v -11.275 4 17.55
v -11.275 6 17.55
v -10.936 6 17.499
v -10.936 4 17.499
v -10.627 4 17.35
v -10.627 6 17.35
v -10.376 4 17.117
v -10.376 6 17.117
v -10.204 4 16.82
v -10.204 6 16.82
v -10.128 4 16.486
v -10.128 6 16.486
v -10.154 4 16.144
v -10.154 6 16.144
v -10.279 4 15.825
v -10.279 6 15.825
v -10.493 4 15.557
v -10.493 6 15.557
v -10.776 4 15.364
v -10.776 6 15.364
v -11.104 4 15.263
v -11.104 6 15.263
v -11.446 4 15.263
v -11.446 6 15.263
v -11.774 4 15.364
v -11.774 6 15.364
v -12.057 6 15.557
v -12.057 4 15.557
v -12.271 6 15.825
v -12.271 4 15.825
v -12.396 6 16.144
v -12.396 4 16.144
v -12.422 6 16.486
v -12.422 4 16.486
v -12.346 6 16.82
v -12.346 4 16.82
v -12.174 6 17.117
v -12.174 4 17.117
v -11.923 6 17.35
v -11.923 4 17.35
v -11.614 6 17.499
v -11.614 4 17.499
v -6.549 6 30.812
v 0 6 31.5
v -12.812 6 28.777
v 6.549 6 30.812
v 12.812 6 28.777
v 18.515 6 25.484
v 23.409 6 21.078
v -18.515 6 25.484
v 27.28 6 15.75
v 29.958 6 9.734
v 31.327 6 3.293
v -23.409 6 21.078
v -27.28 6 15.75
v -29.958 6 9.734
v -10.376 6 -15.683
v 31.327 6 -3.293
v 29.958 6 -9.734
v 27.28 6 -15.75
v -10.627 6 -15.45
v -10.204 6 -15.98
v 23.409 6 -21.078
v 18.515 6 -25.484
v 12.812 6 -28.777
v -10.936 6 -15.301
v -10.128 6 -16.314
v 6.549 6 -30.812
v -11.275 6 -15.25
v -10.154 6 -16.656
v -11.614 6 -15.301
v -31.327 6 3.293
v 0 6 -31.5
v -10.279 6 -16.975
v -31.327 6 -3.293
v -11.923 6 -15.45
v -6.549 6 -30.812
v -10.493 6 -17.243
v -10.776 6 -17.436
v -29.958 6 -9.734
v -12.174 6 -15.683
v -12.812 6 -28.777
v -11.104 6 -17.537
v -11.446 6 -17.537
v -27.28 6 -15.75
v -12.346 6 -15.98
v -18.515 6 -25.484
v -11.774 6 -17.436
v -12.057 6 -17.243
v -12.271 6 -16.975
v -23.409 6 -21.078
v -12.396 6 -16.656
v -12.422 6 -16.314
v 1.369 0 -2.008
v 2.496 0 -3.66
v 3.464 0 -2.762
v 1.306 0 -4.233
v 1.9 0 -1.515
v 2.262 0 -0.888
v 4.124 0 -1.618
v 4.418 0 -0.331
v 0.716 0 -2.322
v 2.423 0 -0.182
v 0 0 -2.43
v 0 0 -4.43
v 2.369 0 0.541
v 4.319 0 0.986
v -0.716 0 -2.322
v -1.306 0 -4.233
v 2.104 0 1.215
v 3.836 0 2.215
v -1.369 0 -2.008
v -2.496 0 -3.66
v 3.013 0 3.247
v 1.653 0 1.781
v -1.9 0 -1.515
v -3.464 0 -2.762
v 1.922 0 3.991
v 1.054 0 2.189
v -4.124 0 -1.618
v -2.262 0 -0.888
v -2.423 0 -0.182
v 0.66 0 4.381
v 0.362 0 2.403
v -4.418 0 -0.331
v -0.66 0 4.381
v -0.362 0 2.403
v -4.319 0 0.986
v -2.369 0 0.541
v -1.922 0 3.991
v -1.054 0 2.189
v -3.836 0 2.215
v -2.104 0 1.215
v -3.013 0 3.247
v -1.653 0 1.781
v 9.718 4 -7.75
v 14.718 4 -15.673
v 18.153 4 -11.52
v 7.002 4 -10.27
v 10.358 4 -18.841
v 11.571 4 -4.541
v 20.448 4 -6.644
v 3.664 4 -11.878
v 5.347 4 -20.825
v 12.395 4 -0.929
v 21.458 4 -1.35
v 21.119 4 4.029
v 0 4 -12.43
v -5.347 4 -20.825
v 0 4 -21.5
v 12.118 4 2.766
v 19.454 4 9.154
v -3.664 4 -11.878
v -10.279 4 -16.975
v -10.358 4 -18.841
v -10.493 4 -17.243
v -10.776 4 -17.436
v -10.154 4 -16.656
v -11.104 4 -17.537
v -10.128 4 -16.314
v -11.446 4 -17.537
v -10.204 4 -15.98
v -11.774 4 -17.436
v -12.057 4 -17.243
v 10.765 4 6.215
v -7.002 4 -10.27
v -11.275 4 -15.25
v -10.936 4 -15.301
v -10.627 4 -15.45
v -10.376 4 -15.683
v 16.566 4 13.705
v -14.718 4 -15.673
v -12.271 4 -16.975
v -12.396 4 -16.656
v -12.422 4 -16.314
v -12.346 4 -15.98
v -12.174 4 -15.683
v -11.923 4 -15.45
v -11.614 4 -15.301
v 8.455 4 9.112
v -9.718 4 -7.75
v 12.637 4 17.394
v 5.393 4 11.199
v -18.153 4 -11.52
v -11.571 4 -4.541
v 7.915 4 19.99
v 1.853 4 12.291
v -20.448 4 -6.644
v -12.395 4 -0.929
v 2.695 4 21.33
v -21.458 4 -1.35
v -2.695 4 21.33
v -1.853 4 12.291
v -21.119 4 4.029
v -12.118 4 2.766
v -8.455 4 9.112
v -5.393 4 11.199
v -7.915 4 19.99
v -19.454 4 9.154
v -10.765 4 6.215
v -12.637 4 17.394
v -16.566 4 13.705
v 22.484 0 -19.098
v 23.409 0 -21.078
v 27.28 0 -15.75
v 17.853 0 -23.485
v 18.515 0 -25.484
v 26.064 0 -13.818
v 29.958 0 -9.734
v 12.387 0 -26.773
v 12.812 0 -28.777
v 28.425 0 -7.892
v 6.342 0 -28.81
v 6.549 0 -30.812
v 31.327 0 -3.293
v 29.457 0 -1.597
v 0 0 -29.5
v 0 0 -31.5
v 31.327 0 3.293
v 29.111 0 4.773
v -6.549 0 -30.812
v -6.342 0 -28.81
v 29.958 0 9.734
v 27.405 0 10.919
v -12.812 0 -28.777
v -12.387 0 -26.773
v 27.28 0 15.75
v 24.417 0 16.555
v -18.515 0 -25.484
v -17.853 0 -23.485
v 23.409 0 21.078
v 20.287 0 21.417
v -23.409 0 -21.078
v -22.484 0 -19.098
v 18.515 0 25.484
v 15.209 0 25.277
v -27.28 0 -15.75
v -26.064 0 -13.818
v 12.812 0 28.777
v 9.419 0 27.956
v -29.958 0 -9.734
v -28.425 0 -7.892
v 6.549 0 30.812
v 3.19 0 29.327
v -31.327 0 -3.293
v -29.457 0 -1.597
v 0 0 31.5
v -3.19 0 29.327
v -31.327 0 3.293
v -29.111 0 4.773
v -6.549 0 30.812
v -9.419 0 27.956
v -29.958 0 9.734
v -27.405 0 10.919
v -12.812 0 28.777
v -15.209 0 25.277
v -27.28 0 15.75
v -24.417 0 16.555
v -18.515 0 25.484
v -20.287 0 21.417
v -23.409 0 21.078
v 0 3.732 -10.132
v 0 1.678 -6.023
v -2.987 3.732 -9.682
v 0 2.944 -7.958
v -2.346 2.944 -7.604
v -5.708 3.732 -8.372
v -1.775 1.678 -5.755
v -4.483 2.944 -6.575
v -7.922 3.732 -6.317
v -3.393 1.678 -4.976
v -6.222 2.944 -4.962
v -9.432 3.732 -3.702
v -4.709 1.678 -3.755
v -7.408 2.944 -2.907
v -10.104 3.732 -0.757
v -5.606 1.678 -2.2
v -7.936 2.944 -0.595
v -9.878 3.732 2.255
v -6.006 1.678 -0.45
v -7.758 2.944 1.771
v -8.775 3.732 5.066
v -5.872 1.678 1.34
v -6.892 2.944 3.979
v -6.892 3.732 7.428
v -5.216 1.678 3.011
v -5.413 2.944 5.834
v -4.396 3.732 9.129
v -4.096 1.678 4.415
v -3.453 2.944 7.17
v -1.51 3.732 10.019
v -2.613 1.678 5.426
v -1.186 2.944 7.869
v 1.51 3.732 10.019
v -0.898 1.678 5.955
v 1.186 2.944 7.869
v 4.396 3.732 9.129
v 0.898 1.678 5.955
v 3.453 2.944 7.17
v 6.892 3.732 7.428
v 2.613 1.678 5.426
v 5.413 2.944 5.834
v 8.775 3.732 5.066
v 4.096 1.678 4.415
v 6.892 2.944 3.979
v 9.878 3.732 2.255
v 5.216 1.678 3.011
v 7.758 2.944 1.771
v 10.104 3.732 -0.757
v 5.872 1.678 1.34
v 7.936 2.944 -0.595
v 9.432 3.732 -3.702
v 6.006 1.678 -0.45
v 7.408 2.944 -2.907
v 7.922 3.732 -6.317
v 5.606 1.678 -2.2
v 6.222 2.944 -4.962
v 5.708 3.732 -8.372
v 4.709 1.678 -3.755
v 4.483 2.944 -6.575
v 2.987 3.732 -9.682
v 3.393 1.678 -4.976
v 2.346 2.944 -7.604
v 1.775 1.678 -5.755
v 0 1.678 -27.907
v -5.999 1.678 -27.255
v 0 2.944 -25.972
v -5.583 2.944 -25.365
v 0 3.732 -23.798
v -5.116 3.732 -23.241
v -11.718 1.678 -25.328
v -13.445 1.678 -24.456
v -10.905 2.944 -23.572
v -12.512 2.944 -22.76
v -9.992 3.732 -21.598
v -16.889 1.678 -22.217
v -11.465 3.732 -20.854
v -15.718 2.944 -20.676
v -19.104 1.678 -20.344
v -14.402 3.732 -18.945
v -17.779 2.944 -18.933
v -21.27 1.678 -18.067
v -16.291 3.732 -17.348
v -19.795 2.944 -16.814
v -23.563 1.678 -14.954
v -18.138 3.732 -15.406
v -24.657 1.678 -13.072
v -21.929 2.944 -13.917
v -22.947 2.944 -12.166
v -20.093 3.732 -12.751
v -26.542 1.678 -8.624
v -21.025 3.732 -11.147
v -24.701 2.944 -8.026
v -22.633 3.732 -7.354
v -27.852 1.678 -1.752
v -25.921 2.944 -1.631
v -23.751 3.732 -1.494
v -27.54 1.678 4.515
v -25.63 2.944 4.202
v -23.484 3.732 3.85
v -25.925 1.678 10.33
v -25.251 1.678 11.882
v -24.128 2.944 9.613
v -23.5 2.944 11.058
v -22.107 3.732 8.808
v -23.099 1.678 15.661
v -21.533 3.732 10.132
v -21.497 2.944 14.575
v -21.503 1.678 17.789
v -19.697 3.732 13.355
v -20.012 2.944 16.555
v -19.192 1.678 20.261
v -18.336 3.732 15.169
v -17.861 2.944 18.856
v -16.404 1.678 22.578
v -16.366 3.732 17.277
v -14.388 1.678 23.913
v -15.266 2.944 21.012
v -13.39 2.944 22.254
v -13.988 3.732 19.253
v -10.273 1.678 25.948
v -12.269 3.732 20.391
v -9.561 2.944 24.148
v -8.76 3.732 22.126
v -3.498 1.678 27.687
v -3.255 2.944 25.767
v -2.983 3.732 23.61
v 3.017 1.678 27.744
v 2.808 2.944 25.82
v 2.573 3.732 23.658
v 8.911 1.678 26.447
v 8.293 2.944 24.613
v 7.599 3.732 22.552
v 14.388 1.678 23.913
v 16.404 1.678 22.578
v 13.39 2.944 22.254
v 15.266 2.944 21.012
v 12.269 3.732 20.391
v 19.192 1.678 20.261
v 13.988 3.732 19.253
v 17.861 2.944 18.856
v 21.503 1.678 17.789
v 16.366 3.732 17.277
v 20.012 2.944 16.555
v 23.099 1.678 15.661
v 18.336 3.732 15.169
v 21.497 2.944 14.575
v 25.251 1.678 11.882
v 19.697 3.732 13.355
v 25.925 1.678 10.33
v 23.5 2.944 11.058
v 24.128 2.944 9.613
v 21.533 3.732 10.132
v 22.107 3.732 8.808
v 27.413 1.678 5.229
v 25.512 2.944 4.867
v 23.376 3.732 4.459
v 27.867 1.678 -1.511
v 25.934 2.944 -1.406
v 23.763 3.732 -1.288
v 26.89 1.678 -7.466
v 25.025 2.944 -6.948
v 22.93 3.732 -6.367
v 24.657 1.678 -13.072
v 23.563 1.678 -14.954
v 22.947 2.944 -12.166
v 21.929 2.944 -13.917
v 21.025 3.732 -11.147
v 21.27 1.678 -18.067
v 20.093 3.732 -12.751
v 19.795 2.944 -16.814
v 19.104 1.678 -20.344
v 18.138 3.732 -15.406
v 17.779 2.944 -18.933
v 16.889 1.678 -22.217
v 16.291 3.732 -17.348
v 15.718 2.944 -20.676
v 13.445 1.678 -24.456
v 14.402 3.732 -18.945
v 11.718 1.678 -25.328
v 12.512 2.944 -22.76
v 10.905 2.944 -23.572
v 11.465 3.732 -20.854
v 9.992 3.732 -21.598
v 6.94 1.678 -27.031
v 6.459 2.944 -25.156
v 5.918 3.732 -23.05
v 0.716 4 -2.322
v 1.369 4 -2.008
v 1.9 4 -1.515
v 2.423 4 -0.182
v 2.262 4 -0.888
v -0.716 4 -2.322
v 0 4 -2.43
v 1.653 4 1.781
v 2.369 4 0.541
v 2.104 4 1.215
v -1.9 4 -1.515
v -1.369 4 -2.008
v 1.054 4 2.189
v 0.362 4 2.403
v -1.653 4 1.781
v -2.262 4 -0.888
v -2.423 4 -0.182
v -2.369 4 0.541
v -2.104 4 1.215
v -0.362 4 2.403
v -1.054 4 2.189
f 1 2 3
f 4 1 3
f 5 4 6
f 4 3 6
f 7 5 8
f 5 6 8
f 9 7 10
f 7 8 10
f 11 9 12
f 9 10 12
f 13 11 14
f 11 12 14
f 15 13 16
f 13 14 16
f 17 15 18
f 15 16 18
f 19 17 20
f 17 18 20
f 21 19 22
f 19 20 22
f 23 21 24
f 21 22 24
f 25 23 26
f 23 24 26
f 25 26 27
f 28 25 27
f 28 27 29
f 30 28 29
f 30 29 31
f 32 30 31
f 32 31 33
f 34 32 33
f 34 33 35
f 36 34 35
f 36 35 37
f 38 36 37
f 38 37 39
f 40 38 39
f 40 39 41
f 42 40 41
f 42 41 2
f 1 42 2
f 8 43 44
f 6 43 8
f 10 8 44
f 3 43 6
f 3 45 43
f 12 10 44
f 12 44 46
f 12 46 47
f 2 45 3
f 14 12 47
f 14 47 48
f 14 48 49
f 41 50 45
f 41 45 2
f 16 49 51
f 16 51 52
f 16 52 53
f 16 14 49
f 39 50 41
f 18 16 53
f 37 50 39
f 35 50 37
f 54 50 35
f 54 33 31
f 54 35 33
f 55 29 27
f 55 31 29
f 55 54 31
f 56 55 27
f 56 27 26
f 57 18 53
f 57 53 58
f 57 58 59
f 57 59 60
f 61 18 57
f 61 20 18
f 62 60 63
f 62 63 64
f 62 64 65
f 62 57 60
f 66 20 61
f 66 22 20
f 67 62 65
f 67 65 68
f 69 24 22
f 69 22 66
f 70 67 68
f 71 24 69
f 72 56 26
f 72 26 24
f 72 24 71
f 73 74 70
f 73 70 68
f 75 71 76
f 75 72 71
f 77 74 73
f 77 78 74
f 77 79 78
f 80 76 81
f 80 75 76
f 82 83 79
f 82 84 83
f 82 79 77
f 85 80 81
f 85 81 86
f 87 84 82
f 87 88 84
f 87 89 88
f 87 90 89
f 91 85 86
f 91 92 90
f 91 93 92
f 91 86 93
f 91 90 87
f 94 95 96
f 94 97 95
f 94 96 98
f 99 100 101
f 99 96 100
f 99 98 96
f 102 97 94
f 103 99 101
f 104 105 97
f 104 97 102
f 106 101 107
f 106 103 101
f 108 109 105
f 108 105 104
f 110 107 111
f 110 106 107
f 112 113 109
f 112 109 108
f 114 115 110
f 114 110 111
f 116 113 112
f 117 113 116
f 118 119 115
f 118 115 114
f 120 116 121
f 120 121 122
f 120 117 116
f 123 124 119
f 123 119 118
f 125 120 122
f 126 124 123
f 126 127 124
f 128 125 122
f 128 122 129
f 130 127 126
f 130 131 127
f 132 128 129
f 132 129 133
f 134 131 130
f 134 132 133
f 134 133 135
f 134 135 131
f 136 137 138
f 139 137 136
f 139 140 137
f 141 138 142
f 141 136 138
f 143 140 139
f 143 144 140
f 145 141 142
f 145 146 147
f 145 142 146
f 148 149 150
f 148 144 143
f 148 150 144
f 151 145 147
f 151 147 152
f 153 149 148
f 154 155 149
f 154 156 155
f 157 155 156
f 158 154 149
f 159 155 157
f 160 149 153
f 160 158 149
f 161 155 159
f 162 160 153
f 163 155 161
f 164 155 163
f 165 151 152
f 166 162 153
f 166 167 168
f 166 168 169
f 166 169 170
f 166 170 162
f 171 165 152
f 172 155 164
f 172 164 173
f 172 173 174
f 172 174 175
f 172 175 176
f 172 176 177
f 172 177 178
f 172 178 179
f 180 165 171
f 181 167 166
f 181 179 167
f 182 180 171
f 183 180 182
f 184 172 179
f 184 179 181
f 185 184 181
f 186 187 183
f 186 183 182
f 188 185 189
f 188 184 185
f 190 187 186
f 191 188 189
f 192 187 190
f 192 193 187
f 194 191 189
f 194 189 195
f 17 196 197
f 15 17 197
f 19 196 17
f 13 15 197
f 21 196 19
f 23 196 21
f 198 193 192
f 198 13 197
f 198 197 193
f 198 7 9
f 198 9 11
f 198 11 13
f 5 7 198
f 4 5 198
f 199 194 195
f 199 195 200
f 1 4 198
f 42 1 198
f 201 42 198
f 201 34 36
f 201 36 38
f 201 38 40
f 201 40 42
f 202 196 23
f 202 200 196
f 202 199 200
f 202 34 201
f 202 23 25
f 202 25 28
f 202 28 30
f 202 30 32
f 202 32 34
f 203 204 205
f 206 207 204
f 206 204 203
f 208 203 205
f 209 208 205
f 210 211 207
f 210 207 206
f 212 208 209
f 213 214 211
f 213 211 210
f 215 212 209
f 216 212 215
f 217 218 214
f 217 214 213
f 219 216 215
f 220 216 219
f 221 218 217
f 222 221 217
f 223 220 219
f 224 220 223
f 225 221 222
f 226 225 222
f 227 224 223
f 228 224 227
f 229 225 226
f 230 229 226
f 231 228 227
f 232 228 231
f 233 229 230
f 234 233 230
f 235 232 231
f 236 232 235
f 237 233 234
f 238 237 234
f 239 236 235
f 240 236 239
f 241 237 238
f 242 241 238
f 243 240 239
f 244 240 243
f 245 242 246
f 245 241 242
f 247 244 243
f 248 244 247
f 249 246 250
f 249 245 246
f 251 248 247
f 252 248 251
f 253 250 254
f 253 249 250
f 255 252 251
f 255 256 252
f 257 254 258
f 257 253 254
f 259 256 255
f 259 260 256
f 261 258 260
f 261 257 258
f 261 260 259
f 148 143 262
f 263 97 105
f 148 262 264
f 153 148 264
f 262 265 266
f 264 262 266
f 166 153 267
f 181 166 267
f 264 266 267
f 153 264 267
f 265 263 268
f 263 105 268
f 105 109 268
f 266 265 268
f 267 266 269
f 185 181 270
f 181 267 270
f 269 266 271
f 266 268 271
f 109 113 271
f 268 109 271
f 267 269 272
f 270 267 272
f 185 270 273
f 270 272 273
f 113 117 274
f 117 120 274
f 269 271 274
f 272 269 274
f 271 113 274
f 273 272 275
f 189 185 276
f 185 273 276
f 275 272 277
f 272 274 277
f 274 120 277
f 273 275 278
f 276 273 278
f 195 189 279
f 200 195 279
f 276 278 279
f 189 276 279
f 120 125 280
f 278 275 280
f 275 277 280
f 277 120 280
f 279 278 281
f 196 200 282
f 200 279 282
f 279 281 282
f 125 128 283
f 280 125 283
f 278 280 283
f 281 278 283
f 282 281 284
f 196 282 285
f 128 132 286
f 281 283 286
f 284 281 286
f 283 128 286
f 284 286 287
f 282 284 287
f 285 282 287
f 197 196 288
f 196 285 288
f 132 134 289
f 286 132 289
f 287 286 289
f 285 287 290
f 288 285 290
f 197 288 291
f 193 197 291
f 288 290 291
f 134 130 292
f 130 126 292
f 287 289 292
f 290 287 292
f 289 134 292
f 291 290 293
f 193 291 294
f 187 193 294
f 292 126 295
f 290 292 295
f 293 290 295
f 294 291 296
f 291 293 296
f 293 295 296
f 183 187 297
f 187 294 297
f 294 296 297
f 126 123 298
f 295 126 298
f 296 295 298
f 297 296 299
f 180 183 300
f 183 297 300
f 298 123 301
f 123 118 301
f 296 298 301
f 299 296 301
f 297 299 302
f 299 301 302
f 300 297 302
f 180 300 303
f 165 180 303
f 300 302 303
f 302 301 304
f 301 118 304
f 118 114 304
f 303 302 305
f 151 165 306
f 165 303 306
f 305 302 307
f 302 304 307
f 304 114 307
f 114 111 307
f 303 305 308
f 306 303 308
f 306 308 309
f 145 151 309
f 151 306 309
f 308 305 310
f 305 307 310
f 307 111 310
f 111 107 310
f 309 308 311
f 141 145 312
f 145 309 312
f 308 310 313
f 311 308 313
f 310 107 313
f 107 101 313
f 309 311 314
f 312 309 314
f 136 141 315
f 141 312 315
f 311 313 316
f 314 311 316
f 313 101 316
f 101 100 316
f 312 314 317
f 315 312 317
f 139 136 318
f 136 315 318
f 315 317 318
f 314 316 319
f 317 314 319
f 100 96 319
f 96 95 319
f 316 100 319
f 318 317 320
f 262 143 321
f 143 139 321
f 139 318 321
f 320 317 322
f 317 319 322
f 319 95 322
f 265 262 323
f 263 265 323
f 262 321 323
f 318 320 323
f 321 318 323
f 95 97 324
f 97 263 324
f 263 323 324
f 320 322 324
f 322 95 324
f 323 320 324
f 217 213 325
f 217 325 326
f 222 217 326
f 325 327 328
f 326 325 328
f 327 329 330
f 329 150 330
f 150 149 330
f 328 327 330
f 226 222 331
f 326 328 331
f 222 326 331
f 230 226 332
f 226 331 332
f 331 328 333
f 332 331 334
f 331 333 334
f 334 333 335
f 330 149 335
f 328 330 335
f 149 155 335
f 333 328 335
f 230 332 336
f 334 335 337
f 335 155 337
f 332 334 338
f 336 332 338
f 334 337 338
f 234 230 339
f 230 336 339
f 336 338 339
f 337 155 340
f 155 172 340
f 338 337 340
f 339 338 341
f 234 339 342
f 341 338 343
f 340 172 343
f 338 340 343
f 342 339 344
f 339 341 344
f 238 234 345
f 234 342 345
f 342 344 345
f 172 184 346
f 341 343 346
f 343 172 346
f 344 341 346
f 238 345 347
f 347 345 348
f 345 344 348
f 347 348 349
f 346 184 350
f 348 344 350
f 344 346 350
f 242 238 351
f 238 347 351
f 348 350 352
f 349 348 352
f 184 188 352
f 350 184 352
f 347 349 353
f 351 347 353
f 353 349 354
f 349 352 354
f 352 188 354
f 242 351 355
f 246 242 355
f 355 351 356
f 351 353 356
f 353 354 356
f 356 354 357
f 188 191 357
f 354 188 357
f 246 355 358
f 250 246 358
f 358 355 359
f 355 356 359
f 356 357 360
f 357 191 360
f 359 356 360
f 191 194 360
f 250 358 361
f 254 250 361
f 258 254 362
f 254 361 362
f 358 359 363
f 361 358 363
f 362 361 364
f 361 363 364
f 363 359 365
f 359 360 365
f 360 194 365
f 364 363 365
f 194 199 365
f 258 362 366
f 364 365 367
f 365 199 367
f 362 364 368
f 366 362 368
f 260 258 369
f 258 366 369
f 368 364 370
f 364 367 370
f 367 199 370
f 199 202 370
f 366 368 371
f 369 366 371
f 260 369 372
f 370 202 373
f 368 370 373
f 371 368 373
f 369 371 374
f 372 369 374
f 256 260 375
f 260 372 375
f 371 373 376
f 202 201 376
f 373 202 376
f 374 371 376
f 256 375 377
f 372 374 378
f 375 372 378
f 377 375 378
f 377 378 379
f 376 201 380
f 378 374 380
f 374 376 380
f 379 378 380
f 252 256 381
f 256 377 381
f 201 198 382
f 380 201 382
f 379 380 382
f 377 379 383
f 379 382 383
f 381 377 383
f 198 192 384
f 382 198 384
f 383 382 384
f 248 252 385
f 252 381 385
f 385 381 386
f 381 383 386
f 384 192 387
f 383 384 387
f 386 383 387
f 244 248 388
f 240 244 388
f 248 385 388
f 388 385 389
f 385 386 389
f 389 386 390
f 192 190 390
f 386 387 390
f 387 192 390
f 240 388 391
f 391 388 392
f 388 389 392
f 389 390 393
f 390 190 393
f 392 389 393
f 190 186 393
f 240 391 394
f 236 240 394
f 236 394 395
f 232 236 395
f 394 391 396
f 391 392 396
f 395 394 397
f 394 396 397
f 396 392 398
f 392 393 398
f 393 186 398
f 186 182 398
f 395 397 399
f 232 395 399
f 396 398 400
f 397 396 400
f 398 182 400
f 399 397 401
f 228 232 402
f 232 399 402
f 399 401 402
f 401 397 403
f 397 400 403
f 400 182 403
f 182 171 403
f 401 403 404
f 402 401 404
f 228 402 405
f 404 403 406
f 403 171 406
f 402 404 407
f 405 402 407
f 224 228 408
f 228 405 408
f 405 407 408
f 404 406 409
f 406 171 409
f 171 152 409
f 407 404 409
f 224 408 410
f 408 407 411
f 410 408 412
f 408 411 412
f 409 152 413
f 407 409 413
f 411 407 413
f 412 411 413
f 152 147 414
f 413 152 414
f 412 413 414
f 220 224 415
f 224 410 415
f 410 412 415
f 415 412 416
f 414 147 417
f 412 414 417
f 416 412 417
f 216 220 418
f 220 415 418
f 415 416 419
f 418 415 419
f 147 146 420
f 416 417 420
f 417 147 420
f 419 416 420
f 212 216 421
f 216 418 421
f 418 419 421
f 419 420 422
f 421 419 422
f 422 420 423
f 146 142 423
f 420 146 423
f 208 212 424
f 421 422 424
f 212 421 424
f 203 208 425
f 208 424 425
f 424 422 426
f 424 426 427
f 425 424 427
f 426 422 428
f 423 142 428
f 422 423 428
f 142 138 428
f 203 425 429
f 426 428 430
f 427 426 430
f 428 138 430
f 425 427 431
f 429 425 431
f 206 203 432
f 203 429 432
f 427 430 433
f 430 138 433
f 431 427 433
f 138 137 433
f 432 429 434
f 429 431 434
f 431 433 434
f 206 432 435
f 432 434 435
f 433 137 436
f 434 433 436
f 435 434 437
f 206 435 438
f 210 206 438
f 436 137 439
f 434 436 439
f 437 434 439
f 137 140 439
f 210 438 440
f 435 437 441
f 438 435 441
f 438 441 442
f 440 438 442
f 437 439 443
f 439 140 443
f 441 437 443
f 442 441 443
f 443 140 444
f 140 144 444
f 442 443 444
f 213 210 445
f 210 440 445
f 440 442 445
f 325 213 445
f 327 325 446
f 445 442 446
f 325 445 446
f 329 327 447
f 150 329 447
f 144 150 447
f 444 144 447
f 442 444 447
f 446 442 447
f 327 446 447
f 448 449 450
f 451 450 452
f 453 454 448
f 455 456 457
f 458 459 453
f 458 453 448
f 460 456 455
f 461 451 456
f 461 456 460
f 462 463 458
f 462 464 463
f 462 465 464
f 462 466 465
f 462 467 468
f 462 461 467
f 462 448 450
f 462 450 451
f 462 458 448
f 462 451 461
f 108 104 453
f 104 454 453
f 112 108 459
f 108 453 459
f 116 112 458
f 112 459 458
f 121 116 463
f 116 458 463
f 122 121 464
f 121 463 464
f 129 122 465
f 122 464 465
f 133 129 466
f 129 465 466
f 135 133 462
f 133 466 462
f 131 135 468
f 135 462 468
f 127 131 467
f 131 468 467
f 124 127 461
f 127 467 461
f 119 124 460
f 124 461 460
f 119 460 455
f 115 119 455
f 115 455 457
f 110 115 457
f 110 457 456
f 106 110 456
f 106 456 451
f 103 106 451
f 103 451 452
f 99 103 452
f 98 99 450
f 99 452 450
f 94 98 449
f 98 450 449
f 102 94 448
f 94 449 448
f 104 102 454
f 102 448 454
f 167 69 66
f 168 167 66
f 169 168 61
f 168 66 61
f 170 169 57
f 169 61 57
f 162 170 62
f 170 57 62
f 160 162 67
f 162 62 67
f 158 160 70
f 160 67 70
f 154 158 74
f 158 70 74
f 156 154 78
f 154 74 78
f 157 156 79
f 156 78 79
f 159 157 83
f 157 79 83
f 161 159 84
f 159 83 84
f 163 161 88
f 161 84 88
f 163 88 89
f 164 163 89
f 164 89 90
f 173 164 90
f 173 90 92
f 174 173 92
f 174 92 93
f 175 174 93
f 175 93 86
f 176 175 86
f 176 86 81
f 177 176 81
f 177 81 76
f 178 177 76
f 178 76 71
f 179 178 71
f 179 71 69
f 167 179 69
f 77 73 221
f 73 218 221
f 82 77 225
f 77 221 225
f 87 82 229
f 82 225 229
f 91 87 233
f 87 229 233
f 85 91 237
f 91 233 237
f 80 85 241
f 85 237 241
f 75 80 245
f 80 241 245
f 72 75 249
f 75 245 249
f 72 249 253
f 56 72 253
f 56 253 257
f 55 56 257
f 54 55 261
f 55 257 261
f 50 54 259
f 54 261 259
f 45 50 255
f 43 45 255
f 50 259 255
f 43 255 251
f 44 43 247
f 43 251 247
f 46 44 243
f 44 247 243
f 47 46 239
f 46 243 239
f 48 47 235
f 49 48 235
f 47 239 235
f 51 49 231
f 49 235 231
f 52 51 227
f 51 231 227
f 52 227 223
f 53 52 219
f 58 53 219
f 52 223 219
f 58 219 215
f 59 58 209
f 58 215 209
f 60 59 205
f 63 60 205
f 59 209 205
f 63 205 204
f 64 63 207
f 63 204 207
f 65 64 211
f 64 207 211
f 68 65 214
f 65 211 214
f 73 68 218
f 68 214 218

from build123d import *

# Parameters (mm, degrees)
FILLET1_R          = 10
SKETCH6_R          = 1.15
CUT_EXTRUDE1_DEPTH = 10


with BuildPart() as part:
    # Sketch2 → Revolve1 (revolve)
    with BuildSketch(Plane.XY, mode=Mode.PRIVATE) as revolve1_sk:
        Polygon((0, 4), (-2.43, 4), (-2.43, 3), (-2.43, 0), (-4.43, 0), (-4.43, 4), (-29.5, 4), (-29.5, 0), (-31.5, 0), (-31.5, 4), (-31.5, 6), (0, 6), align=None)
    revolve(revolve1_sk.sketch.rotate(Axis((0, 0, 0), (0, 1, 0)), 270), axis=Axis((0, 0, 0), (0, 1, 0)))

    # Fillet1
    # the kernel refuses this fillet: 10 mm, written as the material it adds along each edge
    with BuildSketch(Plane(origin=(0, 4, 0), x_dir=(0, 0, -1), z_dir=(1, 0, 0))) as fillet1_piece_1:
        with BuildLine():
            CenterArc((21.5, -10), FILLET1_R, 36.869897646, 53.130102354)
            Line((29.5, -4), (29.66, -3.88))
            ThreePointArc((29.66, -3.88), (29.7, -2), (29.7, 0))
            Line((29.7, 0), (29.5, 0.2))
            Line((29.5, 0.2), (21.5, 0.2))
            Line((21.5, 0.2), (21.5, 0))
        make_face()
    revolve(axis=Axis((0, 4, 0), (0, 1, 0)))
    with BuildSketch(Plane(origin=(0, 4, 0), x_dir=(0, 0, -1), z_dir=(1, 0, 0))) as fillet1_piece_2:
        with BuildLine():
            CenterArc((12.43, -10), FILLET1_R, 90, 53.130102354)
            Line((12.43, 0), (12.43, 0.2))
            Line((12.43, 0.2), (4.43, 0.2))
            Line((4.43, 0.2), (4.23, 0))
            ThreePointArc((4.23, 0), (4.23, -2), (4.27, -3.88))
            Line((4.27, -3.88), (4.43, -4))
        make_face()
    revolve(axis=Axis((0, 4, 0), (0, 1, 0)))

    # Sketch6 → Cut-Extrude1 (cut)
    with BuildSketch(Plane(origin=(0, 6, 0), x_dir=(1, 0, 0), z_dir=(0, 1, 0))):
        with Locations(Location((-11.275, 16.4, 0), (0, 0, 270))):
            Circle(SKETCH6_R)
        with Locations(Location((-11.275, -16.4, 0), (0, 0, 270))):
            Circle(SKETCH6_R)
    extrude(amount=-CUT_EXTRUDE1_DEPTH, mode=Mode.SUBTRACT)


solid = part.part
